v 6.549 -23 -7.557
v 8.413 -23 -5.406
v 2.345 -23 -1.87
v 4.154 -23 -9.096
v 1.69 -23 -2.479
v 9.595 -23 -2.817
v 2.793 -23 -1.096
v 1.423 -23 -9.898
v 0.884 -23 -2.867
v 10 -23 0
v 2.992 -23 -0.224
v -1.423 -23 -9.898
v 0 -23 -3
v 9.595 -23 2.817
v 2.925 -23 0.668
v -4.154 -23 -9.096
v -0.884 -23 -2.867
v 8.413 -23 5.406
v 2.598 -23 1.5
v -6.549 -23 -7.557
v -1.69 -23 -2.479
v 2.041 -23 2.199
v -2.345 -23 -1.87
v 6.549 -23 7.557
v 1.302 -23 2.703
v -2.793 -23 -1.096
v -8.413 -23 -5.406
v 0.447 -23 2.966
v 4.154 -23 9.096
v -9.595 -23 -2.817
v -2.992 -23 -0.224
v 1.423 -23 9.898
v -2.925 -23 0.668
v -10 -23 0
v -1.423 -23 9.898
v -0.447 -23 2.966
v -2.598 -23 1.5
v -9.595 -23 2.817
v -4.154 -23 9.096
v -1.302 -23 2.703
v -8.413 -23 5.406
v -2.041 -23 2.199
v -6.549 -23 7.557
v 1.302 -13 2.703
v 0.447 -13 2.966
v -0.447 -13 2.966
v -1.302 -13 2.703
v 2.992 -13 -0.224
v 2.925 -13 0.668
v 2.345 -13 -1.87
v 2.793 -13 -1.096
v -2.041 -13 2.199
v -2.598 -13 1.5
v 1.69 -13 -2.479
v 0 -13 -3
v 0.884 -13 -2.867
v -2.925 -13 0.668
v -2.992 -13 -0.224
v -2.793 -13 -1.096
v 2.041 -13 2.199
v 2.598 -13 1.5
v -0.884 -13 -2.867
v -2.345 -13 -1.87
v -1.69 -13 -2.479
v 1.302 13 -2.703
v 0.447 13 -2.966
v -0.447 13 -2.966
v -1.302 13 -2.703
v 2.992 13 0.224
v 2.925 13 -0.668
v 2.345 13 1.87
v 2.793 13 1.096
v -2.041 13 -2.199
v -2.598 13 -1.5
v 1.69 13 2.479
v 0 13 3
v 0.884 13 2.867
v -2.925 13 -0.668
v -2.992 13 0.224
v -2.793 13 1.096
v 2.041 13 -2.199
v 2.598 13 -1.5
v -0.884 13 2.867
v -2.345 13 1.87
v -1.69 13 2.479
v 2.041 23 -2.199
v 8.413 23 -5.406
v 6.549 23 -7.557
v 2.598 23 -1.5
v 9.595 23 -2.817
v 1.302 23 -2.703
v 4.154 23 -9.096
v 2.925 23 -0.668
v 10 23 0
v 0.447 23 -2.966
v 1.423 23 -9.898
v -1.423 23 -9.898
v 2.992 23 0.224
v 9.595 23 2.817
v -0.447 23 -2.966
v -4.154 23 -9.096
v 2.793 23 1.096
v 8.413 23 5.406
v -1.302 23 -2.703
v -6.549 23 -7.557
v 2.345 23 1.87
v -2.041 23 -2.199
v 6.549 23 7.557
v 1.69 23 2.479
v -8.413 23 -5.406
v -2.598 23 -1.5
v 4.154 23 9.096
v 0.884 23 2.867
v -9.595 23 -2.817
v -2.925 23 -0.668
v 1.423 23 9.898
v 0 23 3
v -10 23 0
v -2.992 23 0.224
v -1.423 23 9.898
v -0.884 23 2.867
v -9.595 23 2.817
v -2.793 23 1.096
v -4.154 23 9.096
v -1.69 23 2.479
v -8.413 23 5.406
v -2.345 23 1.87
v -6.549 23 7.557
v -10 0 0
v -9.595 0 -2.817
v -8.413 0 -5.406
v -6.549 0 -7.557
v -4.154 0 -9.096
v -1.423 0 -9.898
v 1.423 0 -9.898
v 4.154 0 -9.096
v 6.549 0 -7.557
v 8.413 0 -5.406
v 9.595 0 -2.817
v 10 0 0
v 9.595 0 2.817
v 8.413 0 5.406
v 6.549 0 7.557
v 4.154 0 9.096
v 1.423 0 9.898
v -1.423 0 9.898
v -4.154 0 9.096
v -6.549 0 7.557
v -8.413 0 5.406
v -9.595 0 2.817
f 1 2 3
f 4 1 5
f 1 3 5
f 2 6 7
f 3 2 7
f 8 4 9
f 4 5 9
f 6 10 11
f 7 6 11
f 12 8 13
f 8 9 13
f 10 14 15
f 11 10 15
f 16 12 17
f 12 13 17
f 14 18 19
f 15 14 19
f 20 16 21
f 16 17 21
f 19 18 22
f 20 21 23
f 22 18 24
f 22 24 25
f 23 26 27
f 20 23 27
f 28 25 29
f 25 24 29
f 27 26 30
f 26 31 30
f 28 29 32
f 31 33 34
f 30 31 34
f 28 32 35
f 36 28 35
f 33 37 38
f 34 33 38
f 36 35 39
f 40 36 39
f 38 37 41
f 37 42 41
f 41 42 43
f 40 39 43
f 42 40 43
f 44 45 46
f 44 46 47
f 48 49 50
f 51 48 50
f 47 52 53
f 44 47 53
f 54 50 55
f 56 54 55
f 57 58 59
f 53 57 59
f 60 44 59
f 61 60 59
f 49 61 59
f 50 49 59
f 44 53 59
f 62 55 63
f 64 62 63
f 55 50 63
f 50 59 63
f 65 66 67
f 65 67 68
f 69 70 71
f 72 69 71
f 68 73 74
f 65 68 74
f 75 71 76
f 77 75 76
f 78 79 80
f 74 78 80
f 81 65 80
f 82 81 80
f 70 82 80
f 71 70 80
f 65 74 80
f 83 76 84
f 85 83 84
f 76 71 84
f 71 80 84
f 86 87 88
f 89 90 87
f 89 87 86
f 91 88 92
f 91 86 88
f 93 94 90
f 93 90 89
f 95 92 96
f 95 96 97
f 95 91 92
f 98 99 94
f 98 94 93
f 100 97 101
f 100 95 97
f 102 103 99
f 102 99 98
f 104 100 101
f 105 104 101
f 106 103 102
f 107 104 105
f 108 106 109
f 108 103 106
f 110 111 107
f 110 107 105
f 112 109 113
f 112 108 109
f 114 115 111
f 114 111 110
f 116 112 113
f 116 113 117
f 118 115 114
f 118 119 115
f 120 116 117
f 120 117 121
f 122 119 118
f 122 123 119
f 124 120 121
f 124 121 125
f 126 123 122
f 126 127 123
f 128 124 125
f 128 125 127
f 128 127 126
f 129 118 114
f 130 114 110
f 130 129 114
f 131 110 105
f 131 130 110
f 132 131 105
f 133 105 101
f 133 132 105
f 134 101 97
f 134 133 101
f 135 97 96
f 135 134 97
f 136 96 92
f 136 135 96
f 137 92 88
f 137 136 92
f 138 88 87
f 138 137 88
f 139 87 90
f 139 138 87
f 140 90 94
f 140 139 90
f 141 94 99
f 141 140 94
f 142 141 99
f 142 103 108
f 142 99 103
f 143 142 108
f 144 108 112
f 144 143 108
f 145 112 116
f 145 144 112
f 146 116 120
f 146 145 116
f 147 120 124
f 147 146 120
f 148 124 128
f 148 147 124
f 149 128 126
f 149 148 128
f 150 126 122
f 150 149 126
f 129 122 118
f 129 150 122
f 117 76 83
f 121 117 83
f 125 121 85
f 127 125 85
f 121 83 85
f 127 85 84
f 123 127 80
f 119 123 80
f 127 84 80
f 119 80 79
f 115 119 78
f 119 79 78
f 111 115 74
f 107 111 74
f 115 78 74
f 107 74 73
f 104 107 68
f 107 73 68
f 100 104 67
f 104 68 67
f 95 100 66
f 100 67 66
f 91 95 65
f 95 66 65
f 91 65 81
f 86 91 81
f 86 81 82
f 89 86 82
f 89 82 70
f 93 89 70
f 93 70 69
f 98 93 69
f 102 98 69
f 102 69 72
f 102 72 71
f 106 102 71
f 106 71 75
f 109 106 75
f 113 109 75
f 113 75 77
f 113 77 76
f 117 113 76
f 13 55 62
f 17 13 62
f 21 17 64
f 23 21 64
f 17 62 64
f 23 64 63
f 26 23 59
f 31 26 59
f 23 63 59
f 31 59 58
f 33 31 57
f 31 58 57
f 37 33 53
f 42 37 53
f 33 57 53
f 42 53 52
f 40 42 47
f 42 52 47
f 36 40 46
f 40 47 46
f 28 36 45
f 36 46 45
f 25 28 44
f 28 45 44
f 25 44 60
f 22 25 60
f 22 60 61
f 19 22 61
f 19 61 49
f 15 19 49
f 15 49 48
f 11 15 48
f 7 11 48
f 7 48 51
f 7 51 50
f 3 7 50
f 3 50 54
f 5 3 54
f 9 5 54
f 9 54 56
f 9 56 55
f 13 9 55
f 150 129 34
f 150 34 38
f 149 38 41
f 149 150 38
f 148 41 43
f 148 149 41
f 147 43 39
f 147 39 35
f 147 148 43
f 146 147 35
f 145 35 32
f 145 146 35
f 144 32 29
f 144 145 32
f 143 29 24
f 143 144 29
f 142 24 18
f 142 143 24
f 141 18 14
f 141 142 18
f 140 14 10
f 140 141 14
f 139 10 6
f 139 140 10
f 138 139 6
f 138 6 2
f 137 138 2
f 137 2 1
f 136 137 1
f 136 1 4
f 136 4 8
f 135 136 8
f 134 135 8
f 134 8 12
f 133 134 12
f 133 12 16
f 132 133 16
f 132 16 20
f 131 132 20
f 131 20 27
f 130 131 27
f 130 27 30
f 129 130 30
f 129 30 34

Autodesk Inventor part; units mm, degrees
ref_plane "YZ Plane" through (0, 0, 0) normal (1, 0, 0) x (0, 1, 0)
ref_plane "XZ Plane" through (0, 0, 0) normal (0, 1, 0) x (-1, 0, 0)
ref_plane "XY Plane" through (0, 0, 0) normal (0, 0, 1) x (1, 0, 0)
sketch "Sketch1" plane through (0, 0, 0) normal (0, 1, 0) x (-1, 0, 0)
  circle A0 centre (0, 0) radius 10
  dimension "d0" = 20
extrude "Extrusion1" add sketch "Sketch1" along normal mid plane 46
sketch "Sketch2" plane through (0, 23, 0) normal (0, 1, 0) x (1, 0, 0)
  circle A0 centre (0, 0) radius 10 projected
hole "Hole1" at (0, 23, 0) direction (0, -1, 0) diameter 6 depth 10
sketch "Sketch3" plane through (0, -23, 0) normal (0, -1, 0) x (1, 0, 0)
  circle A0 centre (0, 0) radius 10 projected
hole "Hole2" at (0, -23, 0) direction (0, 1, 0) diameter 6 depth 10
properties part number "Pneumatics Connector" material "Stainless Steel"
